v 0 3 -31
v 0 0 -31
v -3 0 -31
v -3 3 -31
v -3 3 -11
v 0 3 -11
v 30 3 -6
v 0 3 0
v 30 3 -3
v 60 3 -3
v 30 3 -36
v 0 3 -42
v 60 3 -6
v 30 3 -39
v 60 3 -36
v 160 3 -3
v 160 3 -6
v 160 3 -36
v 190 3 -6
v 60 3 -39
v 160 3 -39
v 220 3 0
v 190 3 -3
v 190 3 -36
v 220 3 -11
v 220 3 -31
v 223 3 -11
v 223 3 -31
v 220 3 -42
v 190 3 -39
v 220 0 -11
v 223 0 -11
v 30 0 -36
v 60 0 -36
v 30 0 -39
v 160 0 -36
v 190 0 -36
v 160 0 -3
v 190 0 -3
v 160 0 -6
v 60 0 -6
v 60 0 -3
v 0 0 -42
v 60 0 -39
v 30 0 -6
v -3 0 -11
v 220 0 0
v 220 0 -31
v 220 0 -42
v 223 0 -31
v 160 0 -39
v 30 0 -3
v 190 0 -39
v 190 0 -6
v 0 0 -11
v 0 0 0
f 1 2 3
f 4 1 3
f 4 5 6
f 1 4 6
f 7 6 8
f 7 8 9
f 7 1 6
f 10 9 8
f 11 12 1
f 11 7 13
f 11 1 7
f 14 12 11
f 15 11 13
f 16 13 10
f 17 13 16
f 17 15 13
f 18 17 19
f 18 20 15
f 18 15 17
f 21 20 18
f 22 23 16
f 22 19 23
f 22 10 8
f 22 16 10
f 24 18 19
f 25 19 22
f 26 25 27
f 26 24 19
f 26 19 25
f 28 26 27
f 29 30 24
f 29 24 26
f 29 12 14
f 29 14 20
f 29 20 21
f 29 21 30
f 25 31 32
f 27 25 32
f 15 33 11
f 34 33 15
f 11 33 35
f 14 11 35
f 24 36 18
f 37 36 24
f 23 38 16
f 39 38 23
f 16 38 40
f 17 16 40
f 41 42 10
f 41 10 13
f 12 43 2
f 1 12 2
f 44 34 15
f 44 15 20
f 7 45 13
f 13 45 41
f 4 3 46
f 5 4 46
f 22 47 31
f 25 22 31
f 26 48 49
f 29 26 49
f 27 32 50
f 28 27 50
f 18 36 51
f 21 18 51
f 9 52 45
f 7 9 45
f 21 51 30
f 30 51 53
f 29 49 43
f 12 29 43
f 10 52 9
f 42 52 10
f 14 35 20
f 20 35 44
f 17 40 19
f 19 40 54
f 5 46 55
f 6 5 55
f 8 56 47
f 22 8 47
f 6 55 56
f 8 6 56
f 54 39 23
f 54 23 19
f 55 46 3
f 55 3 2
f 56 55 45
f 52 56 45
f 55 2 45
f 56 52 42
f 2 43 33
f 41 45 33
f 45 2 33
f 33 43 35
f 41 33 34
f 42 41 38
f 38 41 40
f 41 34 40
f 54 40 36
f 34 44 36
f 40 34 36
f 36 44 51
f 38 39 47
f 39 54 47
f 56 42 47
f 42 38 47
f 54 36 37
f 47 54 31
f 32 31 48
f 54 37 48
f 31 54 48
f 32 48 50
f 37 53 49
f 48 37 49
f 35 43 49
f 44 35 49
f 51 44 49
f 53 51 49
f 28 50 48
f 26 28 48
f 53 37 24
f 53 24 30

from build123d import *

# Parameters (mm, degrees)
SKETCH1_W           = 30
SKETCH1_H           = 3
BOSS_EXTRUDE1_DEPTH = 3


with BuildPart() as part:
    # Sketch1 → Boss-Extrude1 (new body)
    with BuildSketch(Plane(origin=(0, 0, 0), x_dir=(1, 0, 0), z_dir=(0, 1, 0))):
        Polygon((0, 0), (220, 0), (220, 11), (223, 11), (223, 31), (220, 31), (220, 42), (0, 42), (0, 31), (-3, 31), (-3, 11), (0, 11), align=None)
        with Locations((45, 37.5)):
            Rectangle(SKETCH1_W, SKETCH1_H, mode=Mode.SUBTRACT)
        with Locations((175, 37.5)):
            Rectangle(SKETCH1_W, SKETCH1_H, mode=Mode.SUBTRACT)
        with Locations((175, 4.5)):
            Rectangle(SKETCH1_W, SKETCH1_H, mode=Mode.SUBTRACT)
        with Locations((45, 4.5)):
            Rectangle(SKETCH1_W, SKETCH1_H, mode=Mode.SUBTRACT)
    extrude(amount=BOSS_EXTRUDE1_DEPTH)


solid = part.part
